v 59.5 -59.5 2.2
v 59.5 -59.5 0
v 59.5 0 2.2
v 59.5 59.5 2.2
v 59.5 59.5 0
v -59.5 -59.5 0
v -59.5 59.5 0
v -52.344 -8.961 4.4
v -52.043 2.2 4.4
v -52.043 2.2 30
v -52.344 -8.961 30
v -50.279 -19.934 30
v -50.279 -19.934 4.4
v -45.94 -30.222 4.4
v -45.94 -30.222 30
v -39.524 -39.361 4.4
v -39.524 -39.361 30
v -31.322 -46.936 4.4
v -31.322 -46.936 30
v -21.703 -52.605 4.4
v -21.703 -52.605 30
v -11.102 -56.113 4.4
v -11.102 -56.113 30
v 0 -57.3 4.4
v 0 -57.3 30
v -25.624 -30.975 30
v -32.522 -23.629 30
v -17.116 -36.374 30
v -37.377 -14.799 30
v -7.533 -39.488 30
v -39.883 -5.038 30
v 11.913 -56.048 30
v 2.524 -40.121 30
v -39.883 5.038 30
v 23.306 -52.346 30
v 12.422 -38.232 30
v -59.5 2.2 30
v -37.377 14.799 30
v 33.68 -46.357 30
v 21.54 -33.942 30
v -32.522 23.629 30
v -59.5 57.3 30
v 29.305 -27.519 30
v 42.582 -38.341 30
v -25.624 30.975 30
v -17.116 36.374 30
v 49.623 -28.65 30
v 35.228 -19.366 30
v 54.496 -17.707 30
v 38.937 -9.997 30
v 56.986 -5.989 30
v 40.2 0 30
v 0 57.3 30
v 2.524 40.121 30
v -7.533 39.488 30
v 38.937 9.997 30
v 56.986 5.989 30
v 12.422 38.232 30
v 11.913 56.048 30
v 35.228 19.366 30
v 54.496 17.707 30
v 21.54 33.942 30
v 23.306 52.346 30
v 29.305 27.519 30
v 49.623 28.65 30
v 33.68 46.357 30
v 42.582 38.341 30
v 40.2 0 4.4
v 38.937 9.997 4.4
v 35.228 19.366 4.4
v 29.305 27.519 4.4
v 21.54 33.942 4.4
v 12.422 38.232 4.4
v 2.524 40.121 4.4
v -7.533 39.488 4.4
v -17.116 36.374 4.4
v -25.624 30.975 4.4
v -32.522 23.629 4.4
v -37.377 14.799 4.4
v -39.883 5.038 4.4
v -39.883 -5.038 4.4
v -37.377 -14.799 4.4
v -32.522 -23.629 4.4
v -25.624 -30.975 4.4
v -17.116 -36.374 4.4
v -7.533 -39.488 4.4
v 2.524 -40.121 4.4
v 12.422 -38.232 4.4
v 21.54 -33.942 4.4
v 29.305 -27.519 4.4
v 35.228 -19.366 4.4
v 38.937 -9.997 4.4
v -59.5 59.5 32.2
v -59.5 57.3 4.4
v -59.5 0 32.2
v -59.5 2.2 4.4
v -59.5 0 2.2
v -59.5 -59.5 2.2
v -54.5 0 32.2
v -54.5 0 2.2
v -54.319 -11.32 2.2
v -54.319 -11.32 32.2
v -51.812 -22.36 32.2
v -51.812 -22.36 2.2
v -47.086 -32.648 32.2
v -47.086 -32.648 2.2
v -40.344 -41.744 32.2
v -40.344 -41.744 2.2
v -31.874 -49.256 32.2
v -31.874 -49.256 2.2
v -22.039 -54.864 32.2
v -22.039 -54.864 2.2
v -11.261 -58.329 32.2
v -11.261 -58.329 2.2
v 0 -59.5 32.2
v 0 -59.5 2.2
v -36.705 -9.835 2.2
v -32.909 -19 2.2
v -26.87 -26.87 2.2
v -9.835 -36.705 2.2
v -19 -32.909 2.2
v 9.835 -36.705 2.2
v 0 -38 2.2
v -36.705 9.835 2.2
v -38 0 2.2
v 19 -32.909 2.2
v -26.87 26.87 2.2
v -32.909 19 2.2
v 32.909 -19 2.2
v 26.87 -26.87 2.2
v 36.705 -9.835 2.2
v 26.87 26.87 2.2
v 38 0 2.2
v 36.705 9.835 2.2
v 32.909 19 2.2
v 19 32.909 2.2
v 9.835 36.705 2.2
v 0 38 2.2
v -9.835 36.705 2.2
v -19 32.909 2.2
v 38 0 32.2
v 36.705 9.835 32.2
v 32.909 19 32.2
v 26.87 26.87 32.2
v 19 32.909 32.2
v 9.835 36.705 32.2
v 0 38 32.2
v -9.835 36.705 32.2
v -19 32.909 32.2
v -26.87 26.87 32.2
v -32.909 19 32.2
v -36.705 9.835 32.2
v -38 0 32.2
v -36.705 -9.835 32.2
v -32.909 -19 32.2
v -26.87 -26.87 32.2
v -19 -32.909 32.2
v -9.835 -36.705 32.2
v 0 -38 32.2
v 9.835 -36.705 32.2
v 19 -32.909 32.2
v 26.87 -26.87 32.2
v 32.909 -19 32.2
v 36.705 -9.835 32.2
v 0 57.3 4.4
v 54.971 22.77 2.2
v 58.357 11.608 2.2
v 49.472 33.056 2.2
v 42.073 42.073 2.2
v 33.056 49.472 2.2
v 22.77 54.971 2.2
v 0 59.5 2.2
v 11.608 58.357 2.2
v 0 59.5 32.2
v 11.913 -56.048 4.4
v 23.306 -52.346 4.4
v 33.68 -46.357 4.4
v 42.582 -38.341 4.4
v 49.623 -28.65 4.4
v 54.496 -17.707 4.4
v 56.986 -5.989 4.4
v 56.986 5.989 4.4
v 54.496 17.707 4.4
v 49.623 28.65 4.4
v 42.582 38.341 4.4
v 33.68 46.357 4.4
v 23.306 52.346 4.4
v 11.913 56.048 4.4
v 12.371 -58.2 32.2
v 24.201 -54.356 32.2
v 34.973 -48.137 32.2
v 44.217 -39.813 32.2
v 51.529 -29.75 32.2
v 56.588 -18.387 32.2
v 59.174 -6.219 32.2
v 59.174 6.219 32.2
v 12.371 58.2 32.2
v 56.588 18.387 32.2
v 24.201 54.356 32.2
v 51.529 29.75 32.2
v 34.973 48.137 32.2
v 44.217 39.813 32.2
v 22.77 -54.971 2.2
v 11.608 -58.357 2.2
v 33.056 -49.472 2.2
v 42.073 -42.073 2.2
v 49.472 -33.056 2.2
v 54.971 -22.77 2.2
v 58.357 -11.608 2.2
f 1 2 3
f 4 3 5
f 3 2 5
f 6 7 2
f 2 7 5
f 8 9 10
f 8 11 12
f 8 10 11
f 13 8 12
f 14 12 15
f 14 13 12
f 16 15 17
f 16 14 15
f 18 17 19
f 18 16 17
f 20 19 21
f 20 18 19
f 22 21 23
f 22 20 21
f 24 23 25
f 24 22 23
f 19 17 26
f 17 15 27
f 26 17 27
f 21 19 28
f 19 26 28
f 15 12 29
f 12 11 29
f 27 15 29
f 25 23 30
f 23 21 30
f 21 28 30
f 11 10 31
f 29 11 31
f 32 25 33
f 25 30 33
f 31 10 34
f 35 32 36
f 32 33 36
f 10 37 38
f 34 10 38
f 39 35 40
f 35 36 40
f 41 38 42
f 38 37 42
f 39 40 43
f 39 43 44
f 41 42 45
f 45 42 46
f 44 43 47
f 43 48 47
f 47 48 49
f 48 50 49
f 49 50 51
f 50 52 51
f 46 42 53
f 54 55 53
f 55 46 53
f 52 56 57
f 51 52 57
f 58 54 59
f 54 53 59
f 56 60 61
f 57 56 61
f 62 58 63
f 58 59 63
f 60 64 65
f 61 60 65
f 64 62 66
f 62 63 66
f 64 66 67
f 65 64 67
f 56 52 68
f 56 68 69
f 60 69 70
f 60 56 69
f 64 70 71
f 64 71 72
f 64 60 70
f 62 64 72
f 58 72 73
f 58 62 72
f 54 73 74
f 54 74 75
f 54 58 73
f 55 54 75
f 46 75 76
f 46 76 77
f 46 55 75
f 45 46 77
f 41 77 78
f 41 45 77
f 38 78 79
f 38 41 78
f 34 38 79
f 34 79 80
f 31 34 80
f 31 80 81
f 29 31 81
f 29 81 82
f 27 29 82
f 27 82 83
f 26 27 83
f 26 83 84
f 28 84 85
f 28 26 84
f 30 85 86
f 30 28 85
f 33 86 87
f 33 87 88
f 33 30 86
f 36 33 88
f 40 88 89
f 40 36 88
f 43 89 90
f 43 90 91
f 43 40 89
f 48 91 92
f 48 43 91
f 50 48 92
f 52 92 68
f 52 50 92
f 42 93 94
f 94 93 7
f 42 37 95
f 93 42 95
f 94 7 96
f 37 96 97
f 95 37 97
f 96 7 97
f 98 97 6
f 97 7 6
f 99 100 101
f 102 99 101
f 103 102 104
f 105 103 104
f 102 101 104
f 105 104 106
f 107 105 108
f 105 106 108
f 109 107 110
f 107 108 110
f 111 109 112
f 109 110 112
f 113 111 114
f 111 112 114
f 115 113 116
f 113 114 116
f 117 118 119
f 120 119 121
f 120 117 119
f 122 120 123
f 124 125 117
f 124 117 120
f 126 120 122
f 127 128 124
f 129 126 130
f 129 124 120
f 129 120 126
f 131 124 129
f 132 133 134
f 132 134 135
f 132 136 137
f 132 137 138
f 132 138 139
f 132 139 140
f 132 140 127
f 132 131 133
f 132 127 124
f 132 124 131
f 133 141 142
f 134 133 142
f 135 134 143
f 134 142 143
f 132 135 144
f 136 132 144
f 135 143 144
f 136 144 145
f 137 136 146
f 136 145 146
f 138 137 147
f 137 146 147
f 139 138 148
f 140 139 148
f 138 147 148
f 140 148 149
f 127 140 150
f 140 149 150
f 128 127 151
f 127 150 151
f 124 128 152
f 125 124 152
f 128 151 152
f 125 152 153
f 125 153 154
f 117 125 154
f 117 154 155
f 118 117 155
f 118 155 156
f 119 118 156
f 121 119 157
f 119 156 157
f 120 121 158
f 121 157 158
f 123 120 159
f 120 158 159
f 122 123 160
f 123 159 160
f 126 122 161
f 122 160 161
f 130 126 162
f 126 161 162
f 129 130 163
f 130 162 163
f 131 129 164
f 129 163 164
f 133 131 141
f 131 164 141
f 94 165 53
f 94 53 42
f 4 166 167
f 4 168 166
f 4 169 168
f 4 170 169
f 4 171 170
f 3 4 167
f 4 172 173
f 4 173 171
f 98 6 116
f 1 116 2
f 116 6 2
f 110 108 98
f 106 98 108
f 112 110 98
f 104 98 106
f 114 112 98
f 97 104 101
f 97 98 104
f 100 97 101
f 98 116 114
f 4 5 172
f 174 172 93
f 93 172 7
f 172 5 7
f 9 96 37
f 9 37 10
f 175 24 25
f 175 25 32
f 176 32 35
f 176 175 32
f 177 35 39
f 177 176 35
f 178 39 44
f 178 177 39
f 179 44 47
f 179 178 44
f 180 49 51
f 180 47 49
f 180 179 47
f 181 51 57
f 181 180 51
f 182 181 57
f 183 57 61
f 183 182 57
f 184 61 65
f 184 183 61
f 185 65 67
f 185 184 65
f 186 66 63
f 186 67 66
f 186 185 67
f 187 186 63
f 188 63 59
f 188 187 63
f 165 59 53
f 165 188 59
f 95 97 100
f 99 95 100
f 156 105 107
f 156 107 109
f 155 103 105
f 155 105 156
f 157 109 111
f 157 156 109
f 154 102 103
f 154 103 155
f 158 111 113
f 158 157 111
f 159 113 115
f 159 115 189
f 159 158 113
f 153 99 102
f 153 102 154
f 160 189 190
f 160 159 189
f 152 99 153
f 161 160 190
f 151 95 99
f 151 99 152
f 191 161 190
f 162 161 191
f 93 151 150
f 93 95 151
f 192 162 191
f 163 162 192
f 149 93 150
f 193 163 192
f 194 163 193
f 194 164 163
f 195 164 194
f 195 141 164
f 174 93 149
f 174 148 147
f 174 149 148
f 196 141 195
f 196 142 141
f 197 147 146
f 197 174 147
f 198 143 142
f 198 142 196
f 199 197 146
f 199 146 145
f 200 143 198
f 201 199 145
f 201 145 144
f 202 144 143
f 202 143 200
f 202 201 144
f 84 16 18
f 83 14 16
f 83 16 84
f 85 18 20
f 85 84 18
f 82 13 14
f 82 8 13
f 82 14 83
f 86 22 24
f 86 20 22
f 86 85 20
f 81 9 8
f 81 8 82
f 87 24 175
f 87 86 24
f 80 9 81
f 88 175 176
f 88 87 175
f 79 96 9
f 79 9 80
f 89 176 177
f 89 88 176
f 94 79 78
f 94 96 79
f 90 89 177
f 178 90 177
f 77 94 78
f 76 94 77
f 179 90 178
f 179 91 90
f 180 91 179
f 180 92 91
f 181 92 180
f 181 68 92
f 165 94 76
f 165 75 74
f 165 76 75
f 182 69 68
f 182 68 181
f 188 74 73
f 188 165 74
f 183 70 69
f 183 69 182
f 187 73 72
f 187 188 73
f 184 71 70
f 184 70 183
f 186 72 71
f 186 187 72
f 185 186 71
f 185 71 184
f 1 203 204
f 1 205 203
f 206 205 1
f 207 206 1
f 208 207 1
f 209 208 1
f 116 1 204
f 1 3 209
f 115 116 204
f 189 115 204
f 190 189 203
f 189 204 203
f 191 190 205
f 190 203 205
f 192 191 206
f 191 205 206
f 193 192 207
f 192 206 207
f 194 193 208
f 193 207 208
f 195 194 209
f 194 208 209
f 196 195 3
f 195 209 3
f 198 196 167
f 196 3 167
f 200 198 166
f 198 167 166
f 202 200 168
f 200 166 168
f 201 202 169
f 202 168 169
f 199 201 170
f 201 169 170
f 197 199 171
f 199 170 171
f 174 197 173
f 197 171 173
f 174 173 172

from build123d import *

# Parameters (mm, degrees)
F0_W     = 119
F0_H     = 119
F1_DEPTH = 2.2
F3_DEPTH = 30
F4_R     = 38
F5_DEPTH = 30
F6_T     = -2.2
F7_DEPTH = 1


with BuildPart() as f1:
    # F0 (on Top) → F1 (new body)
    with BuildSketch(Plane.XY):
        Rectangle(F0_W, F0_H)
    extrude(amount=F1_DEPTH)

    # F7 (add): a face of the model
    f7_faces = [f1.faces().sort_by_distance(p)[0] for p in [
        (0, 0, 2.2),
    ]]


with BuildPart() as f3:
    # F2 (on face) → F3 (new body)
    with BuildSketch(Plane.XY.offset(2.2)):
        with BuildLine():
            ThreePointArc((-54.5, 0), (-40.3438347211, -41.7435124756), (0, -59.5))
            ThreePointArc((0, -59.5), (59.5, 0), (0, 59.5))
            Line((0, 59.5), (-59.5, 59.5))
            Line((-59.5, 59.5), (-59.5, 0))
            Line((-59.5, 0), (-54.5, 0))
        make_face()
    extrude(amount=F3_DEPTH)

    # F4 (on face) → F5 (cut, through all)
    with BuildSketch(Plane.XY.offset(32.2)):
        Circle(F4_R)
    extrude(amount=-F5_DEPTH, mode=Mode.SUBTRACT)

    # F6
    f6_openings = [f3.faces().sort_by_distance(p)[0] for p in [
        (-59.5, 29.75, 17.2),
    ]]
    offset(amount=F6_T, openings=f6_openings, kind=Kind.INTERSECTION)


with BuildPart() as f1_1:
    add(f1.part)

    add(f3.part)  # F7 merges F3
    extrude(f7_faces, amount=-F7_DEPTH)


solid = f1_1.part
